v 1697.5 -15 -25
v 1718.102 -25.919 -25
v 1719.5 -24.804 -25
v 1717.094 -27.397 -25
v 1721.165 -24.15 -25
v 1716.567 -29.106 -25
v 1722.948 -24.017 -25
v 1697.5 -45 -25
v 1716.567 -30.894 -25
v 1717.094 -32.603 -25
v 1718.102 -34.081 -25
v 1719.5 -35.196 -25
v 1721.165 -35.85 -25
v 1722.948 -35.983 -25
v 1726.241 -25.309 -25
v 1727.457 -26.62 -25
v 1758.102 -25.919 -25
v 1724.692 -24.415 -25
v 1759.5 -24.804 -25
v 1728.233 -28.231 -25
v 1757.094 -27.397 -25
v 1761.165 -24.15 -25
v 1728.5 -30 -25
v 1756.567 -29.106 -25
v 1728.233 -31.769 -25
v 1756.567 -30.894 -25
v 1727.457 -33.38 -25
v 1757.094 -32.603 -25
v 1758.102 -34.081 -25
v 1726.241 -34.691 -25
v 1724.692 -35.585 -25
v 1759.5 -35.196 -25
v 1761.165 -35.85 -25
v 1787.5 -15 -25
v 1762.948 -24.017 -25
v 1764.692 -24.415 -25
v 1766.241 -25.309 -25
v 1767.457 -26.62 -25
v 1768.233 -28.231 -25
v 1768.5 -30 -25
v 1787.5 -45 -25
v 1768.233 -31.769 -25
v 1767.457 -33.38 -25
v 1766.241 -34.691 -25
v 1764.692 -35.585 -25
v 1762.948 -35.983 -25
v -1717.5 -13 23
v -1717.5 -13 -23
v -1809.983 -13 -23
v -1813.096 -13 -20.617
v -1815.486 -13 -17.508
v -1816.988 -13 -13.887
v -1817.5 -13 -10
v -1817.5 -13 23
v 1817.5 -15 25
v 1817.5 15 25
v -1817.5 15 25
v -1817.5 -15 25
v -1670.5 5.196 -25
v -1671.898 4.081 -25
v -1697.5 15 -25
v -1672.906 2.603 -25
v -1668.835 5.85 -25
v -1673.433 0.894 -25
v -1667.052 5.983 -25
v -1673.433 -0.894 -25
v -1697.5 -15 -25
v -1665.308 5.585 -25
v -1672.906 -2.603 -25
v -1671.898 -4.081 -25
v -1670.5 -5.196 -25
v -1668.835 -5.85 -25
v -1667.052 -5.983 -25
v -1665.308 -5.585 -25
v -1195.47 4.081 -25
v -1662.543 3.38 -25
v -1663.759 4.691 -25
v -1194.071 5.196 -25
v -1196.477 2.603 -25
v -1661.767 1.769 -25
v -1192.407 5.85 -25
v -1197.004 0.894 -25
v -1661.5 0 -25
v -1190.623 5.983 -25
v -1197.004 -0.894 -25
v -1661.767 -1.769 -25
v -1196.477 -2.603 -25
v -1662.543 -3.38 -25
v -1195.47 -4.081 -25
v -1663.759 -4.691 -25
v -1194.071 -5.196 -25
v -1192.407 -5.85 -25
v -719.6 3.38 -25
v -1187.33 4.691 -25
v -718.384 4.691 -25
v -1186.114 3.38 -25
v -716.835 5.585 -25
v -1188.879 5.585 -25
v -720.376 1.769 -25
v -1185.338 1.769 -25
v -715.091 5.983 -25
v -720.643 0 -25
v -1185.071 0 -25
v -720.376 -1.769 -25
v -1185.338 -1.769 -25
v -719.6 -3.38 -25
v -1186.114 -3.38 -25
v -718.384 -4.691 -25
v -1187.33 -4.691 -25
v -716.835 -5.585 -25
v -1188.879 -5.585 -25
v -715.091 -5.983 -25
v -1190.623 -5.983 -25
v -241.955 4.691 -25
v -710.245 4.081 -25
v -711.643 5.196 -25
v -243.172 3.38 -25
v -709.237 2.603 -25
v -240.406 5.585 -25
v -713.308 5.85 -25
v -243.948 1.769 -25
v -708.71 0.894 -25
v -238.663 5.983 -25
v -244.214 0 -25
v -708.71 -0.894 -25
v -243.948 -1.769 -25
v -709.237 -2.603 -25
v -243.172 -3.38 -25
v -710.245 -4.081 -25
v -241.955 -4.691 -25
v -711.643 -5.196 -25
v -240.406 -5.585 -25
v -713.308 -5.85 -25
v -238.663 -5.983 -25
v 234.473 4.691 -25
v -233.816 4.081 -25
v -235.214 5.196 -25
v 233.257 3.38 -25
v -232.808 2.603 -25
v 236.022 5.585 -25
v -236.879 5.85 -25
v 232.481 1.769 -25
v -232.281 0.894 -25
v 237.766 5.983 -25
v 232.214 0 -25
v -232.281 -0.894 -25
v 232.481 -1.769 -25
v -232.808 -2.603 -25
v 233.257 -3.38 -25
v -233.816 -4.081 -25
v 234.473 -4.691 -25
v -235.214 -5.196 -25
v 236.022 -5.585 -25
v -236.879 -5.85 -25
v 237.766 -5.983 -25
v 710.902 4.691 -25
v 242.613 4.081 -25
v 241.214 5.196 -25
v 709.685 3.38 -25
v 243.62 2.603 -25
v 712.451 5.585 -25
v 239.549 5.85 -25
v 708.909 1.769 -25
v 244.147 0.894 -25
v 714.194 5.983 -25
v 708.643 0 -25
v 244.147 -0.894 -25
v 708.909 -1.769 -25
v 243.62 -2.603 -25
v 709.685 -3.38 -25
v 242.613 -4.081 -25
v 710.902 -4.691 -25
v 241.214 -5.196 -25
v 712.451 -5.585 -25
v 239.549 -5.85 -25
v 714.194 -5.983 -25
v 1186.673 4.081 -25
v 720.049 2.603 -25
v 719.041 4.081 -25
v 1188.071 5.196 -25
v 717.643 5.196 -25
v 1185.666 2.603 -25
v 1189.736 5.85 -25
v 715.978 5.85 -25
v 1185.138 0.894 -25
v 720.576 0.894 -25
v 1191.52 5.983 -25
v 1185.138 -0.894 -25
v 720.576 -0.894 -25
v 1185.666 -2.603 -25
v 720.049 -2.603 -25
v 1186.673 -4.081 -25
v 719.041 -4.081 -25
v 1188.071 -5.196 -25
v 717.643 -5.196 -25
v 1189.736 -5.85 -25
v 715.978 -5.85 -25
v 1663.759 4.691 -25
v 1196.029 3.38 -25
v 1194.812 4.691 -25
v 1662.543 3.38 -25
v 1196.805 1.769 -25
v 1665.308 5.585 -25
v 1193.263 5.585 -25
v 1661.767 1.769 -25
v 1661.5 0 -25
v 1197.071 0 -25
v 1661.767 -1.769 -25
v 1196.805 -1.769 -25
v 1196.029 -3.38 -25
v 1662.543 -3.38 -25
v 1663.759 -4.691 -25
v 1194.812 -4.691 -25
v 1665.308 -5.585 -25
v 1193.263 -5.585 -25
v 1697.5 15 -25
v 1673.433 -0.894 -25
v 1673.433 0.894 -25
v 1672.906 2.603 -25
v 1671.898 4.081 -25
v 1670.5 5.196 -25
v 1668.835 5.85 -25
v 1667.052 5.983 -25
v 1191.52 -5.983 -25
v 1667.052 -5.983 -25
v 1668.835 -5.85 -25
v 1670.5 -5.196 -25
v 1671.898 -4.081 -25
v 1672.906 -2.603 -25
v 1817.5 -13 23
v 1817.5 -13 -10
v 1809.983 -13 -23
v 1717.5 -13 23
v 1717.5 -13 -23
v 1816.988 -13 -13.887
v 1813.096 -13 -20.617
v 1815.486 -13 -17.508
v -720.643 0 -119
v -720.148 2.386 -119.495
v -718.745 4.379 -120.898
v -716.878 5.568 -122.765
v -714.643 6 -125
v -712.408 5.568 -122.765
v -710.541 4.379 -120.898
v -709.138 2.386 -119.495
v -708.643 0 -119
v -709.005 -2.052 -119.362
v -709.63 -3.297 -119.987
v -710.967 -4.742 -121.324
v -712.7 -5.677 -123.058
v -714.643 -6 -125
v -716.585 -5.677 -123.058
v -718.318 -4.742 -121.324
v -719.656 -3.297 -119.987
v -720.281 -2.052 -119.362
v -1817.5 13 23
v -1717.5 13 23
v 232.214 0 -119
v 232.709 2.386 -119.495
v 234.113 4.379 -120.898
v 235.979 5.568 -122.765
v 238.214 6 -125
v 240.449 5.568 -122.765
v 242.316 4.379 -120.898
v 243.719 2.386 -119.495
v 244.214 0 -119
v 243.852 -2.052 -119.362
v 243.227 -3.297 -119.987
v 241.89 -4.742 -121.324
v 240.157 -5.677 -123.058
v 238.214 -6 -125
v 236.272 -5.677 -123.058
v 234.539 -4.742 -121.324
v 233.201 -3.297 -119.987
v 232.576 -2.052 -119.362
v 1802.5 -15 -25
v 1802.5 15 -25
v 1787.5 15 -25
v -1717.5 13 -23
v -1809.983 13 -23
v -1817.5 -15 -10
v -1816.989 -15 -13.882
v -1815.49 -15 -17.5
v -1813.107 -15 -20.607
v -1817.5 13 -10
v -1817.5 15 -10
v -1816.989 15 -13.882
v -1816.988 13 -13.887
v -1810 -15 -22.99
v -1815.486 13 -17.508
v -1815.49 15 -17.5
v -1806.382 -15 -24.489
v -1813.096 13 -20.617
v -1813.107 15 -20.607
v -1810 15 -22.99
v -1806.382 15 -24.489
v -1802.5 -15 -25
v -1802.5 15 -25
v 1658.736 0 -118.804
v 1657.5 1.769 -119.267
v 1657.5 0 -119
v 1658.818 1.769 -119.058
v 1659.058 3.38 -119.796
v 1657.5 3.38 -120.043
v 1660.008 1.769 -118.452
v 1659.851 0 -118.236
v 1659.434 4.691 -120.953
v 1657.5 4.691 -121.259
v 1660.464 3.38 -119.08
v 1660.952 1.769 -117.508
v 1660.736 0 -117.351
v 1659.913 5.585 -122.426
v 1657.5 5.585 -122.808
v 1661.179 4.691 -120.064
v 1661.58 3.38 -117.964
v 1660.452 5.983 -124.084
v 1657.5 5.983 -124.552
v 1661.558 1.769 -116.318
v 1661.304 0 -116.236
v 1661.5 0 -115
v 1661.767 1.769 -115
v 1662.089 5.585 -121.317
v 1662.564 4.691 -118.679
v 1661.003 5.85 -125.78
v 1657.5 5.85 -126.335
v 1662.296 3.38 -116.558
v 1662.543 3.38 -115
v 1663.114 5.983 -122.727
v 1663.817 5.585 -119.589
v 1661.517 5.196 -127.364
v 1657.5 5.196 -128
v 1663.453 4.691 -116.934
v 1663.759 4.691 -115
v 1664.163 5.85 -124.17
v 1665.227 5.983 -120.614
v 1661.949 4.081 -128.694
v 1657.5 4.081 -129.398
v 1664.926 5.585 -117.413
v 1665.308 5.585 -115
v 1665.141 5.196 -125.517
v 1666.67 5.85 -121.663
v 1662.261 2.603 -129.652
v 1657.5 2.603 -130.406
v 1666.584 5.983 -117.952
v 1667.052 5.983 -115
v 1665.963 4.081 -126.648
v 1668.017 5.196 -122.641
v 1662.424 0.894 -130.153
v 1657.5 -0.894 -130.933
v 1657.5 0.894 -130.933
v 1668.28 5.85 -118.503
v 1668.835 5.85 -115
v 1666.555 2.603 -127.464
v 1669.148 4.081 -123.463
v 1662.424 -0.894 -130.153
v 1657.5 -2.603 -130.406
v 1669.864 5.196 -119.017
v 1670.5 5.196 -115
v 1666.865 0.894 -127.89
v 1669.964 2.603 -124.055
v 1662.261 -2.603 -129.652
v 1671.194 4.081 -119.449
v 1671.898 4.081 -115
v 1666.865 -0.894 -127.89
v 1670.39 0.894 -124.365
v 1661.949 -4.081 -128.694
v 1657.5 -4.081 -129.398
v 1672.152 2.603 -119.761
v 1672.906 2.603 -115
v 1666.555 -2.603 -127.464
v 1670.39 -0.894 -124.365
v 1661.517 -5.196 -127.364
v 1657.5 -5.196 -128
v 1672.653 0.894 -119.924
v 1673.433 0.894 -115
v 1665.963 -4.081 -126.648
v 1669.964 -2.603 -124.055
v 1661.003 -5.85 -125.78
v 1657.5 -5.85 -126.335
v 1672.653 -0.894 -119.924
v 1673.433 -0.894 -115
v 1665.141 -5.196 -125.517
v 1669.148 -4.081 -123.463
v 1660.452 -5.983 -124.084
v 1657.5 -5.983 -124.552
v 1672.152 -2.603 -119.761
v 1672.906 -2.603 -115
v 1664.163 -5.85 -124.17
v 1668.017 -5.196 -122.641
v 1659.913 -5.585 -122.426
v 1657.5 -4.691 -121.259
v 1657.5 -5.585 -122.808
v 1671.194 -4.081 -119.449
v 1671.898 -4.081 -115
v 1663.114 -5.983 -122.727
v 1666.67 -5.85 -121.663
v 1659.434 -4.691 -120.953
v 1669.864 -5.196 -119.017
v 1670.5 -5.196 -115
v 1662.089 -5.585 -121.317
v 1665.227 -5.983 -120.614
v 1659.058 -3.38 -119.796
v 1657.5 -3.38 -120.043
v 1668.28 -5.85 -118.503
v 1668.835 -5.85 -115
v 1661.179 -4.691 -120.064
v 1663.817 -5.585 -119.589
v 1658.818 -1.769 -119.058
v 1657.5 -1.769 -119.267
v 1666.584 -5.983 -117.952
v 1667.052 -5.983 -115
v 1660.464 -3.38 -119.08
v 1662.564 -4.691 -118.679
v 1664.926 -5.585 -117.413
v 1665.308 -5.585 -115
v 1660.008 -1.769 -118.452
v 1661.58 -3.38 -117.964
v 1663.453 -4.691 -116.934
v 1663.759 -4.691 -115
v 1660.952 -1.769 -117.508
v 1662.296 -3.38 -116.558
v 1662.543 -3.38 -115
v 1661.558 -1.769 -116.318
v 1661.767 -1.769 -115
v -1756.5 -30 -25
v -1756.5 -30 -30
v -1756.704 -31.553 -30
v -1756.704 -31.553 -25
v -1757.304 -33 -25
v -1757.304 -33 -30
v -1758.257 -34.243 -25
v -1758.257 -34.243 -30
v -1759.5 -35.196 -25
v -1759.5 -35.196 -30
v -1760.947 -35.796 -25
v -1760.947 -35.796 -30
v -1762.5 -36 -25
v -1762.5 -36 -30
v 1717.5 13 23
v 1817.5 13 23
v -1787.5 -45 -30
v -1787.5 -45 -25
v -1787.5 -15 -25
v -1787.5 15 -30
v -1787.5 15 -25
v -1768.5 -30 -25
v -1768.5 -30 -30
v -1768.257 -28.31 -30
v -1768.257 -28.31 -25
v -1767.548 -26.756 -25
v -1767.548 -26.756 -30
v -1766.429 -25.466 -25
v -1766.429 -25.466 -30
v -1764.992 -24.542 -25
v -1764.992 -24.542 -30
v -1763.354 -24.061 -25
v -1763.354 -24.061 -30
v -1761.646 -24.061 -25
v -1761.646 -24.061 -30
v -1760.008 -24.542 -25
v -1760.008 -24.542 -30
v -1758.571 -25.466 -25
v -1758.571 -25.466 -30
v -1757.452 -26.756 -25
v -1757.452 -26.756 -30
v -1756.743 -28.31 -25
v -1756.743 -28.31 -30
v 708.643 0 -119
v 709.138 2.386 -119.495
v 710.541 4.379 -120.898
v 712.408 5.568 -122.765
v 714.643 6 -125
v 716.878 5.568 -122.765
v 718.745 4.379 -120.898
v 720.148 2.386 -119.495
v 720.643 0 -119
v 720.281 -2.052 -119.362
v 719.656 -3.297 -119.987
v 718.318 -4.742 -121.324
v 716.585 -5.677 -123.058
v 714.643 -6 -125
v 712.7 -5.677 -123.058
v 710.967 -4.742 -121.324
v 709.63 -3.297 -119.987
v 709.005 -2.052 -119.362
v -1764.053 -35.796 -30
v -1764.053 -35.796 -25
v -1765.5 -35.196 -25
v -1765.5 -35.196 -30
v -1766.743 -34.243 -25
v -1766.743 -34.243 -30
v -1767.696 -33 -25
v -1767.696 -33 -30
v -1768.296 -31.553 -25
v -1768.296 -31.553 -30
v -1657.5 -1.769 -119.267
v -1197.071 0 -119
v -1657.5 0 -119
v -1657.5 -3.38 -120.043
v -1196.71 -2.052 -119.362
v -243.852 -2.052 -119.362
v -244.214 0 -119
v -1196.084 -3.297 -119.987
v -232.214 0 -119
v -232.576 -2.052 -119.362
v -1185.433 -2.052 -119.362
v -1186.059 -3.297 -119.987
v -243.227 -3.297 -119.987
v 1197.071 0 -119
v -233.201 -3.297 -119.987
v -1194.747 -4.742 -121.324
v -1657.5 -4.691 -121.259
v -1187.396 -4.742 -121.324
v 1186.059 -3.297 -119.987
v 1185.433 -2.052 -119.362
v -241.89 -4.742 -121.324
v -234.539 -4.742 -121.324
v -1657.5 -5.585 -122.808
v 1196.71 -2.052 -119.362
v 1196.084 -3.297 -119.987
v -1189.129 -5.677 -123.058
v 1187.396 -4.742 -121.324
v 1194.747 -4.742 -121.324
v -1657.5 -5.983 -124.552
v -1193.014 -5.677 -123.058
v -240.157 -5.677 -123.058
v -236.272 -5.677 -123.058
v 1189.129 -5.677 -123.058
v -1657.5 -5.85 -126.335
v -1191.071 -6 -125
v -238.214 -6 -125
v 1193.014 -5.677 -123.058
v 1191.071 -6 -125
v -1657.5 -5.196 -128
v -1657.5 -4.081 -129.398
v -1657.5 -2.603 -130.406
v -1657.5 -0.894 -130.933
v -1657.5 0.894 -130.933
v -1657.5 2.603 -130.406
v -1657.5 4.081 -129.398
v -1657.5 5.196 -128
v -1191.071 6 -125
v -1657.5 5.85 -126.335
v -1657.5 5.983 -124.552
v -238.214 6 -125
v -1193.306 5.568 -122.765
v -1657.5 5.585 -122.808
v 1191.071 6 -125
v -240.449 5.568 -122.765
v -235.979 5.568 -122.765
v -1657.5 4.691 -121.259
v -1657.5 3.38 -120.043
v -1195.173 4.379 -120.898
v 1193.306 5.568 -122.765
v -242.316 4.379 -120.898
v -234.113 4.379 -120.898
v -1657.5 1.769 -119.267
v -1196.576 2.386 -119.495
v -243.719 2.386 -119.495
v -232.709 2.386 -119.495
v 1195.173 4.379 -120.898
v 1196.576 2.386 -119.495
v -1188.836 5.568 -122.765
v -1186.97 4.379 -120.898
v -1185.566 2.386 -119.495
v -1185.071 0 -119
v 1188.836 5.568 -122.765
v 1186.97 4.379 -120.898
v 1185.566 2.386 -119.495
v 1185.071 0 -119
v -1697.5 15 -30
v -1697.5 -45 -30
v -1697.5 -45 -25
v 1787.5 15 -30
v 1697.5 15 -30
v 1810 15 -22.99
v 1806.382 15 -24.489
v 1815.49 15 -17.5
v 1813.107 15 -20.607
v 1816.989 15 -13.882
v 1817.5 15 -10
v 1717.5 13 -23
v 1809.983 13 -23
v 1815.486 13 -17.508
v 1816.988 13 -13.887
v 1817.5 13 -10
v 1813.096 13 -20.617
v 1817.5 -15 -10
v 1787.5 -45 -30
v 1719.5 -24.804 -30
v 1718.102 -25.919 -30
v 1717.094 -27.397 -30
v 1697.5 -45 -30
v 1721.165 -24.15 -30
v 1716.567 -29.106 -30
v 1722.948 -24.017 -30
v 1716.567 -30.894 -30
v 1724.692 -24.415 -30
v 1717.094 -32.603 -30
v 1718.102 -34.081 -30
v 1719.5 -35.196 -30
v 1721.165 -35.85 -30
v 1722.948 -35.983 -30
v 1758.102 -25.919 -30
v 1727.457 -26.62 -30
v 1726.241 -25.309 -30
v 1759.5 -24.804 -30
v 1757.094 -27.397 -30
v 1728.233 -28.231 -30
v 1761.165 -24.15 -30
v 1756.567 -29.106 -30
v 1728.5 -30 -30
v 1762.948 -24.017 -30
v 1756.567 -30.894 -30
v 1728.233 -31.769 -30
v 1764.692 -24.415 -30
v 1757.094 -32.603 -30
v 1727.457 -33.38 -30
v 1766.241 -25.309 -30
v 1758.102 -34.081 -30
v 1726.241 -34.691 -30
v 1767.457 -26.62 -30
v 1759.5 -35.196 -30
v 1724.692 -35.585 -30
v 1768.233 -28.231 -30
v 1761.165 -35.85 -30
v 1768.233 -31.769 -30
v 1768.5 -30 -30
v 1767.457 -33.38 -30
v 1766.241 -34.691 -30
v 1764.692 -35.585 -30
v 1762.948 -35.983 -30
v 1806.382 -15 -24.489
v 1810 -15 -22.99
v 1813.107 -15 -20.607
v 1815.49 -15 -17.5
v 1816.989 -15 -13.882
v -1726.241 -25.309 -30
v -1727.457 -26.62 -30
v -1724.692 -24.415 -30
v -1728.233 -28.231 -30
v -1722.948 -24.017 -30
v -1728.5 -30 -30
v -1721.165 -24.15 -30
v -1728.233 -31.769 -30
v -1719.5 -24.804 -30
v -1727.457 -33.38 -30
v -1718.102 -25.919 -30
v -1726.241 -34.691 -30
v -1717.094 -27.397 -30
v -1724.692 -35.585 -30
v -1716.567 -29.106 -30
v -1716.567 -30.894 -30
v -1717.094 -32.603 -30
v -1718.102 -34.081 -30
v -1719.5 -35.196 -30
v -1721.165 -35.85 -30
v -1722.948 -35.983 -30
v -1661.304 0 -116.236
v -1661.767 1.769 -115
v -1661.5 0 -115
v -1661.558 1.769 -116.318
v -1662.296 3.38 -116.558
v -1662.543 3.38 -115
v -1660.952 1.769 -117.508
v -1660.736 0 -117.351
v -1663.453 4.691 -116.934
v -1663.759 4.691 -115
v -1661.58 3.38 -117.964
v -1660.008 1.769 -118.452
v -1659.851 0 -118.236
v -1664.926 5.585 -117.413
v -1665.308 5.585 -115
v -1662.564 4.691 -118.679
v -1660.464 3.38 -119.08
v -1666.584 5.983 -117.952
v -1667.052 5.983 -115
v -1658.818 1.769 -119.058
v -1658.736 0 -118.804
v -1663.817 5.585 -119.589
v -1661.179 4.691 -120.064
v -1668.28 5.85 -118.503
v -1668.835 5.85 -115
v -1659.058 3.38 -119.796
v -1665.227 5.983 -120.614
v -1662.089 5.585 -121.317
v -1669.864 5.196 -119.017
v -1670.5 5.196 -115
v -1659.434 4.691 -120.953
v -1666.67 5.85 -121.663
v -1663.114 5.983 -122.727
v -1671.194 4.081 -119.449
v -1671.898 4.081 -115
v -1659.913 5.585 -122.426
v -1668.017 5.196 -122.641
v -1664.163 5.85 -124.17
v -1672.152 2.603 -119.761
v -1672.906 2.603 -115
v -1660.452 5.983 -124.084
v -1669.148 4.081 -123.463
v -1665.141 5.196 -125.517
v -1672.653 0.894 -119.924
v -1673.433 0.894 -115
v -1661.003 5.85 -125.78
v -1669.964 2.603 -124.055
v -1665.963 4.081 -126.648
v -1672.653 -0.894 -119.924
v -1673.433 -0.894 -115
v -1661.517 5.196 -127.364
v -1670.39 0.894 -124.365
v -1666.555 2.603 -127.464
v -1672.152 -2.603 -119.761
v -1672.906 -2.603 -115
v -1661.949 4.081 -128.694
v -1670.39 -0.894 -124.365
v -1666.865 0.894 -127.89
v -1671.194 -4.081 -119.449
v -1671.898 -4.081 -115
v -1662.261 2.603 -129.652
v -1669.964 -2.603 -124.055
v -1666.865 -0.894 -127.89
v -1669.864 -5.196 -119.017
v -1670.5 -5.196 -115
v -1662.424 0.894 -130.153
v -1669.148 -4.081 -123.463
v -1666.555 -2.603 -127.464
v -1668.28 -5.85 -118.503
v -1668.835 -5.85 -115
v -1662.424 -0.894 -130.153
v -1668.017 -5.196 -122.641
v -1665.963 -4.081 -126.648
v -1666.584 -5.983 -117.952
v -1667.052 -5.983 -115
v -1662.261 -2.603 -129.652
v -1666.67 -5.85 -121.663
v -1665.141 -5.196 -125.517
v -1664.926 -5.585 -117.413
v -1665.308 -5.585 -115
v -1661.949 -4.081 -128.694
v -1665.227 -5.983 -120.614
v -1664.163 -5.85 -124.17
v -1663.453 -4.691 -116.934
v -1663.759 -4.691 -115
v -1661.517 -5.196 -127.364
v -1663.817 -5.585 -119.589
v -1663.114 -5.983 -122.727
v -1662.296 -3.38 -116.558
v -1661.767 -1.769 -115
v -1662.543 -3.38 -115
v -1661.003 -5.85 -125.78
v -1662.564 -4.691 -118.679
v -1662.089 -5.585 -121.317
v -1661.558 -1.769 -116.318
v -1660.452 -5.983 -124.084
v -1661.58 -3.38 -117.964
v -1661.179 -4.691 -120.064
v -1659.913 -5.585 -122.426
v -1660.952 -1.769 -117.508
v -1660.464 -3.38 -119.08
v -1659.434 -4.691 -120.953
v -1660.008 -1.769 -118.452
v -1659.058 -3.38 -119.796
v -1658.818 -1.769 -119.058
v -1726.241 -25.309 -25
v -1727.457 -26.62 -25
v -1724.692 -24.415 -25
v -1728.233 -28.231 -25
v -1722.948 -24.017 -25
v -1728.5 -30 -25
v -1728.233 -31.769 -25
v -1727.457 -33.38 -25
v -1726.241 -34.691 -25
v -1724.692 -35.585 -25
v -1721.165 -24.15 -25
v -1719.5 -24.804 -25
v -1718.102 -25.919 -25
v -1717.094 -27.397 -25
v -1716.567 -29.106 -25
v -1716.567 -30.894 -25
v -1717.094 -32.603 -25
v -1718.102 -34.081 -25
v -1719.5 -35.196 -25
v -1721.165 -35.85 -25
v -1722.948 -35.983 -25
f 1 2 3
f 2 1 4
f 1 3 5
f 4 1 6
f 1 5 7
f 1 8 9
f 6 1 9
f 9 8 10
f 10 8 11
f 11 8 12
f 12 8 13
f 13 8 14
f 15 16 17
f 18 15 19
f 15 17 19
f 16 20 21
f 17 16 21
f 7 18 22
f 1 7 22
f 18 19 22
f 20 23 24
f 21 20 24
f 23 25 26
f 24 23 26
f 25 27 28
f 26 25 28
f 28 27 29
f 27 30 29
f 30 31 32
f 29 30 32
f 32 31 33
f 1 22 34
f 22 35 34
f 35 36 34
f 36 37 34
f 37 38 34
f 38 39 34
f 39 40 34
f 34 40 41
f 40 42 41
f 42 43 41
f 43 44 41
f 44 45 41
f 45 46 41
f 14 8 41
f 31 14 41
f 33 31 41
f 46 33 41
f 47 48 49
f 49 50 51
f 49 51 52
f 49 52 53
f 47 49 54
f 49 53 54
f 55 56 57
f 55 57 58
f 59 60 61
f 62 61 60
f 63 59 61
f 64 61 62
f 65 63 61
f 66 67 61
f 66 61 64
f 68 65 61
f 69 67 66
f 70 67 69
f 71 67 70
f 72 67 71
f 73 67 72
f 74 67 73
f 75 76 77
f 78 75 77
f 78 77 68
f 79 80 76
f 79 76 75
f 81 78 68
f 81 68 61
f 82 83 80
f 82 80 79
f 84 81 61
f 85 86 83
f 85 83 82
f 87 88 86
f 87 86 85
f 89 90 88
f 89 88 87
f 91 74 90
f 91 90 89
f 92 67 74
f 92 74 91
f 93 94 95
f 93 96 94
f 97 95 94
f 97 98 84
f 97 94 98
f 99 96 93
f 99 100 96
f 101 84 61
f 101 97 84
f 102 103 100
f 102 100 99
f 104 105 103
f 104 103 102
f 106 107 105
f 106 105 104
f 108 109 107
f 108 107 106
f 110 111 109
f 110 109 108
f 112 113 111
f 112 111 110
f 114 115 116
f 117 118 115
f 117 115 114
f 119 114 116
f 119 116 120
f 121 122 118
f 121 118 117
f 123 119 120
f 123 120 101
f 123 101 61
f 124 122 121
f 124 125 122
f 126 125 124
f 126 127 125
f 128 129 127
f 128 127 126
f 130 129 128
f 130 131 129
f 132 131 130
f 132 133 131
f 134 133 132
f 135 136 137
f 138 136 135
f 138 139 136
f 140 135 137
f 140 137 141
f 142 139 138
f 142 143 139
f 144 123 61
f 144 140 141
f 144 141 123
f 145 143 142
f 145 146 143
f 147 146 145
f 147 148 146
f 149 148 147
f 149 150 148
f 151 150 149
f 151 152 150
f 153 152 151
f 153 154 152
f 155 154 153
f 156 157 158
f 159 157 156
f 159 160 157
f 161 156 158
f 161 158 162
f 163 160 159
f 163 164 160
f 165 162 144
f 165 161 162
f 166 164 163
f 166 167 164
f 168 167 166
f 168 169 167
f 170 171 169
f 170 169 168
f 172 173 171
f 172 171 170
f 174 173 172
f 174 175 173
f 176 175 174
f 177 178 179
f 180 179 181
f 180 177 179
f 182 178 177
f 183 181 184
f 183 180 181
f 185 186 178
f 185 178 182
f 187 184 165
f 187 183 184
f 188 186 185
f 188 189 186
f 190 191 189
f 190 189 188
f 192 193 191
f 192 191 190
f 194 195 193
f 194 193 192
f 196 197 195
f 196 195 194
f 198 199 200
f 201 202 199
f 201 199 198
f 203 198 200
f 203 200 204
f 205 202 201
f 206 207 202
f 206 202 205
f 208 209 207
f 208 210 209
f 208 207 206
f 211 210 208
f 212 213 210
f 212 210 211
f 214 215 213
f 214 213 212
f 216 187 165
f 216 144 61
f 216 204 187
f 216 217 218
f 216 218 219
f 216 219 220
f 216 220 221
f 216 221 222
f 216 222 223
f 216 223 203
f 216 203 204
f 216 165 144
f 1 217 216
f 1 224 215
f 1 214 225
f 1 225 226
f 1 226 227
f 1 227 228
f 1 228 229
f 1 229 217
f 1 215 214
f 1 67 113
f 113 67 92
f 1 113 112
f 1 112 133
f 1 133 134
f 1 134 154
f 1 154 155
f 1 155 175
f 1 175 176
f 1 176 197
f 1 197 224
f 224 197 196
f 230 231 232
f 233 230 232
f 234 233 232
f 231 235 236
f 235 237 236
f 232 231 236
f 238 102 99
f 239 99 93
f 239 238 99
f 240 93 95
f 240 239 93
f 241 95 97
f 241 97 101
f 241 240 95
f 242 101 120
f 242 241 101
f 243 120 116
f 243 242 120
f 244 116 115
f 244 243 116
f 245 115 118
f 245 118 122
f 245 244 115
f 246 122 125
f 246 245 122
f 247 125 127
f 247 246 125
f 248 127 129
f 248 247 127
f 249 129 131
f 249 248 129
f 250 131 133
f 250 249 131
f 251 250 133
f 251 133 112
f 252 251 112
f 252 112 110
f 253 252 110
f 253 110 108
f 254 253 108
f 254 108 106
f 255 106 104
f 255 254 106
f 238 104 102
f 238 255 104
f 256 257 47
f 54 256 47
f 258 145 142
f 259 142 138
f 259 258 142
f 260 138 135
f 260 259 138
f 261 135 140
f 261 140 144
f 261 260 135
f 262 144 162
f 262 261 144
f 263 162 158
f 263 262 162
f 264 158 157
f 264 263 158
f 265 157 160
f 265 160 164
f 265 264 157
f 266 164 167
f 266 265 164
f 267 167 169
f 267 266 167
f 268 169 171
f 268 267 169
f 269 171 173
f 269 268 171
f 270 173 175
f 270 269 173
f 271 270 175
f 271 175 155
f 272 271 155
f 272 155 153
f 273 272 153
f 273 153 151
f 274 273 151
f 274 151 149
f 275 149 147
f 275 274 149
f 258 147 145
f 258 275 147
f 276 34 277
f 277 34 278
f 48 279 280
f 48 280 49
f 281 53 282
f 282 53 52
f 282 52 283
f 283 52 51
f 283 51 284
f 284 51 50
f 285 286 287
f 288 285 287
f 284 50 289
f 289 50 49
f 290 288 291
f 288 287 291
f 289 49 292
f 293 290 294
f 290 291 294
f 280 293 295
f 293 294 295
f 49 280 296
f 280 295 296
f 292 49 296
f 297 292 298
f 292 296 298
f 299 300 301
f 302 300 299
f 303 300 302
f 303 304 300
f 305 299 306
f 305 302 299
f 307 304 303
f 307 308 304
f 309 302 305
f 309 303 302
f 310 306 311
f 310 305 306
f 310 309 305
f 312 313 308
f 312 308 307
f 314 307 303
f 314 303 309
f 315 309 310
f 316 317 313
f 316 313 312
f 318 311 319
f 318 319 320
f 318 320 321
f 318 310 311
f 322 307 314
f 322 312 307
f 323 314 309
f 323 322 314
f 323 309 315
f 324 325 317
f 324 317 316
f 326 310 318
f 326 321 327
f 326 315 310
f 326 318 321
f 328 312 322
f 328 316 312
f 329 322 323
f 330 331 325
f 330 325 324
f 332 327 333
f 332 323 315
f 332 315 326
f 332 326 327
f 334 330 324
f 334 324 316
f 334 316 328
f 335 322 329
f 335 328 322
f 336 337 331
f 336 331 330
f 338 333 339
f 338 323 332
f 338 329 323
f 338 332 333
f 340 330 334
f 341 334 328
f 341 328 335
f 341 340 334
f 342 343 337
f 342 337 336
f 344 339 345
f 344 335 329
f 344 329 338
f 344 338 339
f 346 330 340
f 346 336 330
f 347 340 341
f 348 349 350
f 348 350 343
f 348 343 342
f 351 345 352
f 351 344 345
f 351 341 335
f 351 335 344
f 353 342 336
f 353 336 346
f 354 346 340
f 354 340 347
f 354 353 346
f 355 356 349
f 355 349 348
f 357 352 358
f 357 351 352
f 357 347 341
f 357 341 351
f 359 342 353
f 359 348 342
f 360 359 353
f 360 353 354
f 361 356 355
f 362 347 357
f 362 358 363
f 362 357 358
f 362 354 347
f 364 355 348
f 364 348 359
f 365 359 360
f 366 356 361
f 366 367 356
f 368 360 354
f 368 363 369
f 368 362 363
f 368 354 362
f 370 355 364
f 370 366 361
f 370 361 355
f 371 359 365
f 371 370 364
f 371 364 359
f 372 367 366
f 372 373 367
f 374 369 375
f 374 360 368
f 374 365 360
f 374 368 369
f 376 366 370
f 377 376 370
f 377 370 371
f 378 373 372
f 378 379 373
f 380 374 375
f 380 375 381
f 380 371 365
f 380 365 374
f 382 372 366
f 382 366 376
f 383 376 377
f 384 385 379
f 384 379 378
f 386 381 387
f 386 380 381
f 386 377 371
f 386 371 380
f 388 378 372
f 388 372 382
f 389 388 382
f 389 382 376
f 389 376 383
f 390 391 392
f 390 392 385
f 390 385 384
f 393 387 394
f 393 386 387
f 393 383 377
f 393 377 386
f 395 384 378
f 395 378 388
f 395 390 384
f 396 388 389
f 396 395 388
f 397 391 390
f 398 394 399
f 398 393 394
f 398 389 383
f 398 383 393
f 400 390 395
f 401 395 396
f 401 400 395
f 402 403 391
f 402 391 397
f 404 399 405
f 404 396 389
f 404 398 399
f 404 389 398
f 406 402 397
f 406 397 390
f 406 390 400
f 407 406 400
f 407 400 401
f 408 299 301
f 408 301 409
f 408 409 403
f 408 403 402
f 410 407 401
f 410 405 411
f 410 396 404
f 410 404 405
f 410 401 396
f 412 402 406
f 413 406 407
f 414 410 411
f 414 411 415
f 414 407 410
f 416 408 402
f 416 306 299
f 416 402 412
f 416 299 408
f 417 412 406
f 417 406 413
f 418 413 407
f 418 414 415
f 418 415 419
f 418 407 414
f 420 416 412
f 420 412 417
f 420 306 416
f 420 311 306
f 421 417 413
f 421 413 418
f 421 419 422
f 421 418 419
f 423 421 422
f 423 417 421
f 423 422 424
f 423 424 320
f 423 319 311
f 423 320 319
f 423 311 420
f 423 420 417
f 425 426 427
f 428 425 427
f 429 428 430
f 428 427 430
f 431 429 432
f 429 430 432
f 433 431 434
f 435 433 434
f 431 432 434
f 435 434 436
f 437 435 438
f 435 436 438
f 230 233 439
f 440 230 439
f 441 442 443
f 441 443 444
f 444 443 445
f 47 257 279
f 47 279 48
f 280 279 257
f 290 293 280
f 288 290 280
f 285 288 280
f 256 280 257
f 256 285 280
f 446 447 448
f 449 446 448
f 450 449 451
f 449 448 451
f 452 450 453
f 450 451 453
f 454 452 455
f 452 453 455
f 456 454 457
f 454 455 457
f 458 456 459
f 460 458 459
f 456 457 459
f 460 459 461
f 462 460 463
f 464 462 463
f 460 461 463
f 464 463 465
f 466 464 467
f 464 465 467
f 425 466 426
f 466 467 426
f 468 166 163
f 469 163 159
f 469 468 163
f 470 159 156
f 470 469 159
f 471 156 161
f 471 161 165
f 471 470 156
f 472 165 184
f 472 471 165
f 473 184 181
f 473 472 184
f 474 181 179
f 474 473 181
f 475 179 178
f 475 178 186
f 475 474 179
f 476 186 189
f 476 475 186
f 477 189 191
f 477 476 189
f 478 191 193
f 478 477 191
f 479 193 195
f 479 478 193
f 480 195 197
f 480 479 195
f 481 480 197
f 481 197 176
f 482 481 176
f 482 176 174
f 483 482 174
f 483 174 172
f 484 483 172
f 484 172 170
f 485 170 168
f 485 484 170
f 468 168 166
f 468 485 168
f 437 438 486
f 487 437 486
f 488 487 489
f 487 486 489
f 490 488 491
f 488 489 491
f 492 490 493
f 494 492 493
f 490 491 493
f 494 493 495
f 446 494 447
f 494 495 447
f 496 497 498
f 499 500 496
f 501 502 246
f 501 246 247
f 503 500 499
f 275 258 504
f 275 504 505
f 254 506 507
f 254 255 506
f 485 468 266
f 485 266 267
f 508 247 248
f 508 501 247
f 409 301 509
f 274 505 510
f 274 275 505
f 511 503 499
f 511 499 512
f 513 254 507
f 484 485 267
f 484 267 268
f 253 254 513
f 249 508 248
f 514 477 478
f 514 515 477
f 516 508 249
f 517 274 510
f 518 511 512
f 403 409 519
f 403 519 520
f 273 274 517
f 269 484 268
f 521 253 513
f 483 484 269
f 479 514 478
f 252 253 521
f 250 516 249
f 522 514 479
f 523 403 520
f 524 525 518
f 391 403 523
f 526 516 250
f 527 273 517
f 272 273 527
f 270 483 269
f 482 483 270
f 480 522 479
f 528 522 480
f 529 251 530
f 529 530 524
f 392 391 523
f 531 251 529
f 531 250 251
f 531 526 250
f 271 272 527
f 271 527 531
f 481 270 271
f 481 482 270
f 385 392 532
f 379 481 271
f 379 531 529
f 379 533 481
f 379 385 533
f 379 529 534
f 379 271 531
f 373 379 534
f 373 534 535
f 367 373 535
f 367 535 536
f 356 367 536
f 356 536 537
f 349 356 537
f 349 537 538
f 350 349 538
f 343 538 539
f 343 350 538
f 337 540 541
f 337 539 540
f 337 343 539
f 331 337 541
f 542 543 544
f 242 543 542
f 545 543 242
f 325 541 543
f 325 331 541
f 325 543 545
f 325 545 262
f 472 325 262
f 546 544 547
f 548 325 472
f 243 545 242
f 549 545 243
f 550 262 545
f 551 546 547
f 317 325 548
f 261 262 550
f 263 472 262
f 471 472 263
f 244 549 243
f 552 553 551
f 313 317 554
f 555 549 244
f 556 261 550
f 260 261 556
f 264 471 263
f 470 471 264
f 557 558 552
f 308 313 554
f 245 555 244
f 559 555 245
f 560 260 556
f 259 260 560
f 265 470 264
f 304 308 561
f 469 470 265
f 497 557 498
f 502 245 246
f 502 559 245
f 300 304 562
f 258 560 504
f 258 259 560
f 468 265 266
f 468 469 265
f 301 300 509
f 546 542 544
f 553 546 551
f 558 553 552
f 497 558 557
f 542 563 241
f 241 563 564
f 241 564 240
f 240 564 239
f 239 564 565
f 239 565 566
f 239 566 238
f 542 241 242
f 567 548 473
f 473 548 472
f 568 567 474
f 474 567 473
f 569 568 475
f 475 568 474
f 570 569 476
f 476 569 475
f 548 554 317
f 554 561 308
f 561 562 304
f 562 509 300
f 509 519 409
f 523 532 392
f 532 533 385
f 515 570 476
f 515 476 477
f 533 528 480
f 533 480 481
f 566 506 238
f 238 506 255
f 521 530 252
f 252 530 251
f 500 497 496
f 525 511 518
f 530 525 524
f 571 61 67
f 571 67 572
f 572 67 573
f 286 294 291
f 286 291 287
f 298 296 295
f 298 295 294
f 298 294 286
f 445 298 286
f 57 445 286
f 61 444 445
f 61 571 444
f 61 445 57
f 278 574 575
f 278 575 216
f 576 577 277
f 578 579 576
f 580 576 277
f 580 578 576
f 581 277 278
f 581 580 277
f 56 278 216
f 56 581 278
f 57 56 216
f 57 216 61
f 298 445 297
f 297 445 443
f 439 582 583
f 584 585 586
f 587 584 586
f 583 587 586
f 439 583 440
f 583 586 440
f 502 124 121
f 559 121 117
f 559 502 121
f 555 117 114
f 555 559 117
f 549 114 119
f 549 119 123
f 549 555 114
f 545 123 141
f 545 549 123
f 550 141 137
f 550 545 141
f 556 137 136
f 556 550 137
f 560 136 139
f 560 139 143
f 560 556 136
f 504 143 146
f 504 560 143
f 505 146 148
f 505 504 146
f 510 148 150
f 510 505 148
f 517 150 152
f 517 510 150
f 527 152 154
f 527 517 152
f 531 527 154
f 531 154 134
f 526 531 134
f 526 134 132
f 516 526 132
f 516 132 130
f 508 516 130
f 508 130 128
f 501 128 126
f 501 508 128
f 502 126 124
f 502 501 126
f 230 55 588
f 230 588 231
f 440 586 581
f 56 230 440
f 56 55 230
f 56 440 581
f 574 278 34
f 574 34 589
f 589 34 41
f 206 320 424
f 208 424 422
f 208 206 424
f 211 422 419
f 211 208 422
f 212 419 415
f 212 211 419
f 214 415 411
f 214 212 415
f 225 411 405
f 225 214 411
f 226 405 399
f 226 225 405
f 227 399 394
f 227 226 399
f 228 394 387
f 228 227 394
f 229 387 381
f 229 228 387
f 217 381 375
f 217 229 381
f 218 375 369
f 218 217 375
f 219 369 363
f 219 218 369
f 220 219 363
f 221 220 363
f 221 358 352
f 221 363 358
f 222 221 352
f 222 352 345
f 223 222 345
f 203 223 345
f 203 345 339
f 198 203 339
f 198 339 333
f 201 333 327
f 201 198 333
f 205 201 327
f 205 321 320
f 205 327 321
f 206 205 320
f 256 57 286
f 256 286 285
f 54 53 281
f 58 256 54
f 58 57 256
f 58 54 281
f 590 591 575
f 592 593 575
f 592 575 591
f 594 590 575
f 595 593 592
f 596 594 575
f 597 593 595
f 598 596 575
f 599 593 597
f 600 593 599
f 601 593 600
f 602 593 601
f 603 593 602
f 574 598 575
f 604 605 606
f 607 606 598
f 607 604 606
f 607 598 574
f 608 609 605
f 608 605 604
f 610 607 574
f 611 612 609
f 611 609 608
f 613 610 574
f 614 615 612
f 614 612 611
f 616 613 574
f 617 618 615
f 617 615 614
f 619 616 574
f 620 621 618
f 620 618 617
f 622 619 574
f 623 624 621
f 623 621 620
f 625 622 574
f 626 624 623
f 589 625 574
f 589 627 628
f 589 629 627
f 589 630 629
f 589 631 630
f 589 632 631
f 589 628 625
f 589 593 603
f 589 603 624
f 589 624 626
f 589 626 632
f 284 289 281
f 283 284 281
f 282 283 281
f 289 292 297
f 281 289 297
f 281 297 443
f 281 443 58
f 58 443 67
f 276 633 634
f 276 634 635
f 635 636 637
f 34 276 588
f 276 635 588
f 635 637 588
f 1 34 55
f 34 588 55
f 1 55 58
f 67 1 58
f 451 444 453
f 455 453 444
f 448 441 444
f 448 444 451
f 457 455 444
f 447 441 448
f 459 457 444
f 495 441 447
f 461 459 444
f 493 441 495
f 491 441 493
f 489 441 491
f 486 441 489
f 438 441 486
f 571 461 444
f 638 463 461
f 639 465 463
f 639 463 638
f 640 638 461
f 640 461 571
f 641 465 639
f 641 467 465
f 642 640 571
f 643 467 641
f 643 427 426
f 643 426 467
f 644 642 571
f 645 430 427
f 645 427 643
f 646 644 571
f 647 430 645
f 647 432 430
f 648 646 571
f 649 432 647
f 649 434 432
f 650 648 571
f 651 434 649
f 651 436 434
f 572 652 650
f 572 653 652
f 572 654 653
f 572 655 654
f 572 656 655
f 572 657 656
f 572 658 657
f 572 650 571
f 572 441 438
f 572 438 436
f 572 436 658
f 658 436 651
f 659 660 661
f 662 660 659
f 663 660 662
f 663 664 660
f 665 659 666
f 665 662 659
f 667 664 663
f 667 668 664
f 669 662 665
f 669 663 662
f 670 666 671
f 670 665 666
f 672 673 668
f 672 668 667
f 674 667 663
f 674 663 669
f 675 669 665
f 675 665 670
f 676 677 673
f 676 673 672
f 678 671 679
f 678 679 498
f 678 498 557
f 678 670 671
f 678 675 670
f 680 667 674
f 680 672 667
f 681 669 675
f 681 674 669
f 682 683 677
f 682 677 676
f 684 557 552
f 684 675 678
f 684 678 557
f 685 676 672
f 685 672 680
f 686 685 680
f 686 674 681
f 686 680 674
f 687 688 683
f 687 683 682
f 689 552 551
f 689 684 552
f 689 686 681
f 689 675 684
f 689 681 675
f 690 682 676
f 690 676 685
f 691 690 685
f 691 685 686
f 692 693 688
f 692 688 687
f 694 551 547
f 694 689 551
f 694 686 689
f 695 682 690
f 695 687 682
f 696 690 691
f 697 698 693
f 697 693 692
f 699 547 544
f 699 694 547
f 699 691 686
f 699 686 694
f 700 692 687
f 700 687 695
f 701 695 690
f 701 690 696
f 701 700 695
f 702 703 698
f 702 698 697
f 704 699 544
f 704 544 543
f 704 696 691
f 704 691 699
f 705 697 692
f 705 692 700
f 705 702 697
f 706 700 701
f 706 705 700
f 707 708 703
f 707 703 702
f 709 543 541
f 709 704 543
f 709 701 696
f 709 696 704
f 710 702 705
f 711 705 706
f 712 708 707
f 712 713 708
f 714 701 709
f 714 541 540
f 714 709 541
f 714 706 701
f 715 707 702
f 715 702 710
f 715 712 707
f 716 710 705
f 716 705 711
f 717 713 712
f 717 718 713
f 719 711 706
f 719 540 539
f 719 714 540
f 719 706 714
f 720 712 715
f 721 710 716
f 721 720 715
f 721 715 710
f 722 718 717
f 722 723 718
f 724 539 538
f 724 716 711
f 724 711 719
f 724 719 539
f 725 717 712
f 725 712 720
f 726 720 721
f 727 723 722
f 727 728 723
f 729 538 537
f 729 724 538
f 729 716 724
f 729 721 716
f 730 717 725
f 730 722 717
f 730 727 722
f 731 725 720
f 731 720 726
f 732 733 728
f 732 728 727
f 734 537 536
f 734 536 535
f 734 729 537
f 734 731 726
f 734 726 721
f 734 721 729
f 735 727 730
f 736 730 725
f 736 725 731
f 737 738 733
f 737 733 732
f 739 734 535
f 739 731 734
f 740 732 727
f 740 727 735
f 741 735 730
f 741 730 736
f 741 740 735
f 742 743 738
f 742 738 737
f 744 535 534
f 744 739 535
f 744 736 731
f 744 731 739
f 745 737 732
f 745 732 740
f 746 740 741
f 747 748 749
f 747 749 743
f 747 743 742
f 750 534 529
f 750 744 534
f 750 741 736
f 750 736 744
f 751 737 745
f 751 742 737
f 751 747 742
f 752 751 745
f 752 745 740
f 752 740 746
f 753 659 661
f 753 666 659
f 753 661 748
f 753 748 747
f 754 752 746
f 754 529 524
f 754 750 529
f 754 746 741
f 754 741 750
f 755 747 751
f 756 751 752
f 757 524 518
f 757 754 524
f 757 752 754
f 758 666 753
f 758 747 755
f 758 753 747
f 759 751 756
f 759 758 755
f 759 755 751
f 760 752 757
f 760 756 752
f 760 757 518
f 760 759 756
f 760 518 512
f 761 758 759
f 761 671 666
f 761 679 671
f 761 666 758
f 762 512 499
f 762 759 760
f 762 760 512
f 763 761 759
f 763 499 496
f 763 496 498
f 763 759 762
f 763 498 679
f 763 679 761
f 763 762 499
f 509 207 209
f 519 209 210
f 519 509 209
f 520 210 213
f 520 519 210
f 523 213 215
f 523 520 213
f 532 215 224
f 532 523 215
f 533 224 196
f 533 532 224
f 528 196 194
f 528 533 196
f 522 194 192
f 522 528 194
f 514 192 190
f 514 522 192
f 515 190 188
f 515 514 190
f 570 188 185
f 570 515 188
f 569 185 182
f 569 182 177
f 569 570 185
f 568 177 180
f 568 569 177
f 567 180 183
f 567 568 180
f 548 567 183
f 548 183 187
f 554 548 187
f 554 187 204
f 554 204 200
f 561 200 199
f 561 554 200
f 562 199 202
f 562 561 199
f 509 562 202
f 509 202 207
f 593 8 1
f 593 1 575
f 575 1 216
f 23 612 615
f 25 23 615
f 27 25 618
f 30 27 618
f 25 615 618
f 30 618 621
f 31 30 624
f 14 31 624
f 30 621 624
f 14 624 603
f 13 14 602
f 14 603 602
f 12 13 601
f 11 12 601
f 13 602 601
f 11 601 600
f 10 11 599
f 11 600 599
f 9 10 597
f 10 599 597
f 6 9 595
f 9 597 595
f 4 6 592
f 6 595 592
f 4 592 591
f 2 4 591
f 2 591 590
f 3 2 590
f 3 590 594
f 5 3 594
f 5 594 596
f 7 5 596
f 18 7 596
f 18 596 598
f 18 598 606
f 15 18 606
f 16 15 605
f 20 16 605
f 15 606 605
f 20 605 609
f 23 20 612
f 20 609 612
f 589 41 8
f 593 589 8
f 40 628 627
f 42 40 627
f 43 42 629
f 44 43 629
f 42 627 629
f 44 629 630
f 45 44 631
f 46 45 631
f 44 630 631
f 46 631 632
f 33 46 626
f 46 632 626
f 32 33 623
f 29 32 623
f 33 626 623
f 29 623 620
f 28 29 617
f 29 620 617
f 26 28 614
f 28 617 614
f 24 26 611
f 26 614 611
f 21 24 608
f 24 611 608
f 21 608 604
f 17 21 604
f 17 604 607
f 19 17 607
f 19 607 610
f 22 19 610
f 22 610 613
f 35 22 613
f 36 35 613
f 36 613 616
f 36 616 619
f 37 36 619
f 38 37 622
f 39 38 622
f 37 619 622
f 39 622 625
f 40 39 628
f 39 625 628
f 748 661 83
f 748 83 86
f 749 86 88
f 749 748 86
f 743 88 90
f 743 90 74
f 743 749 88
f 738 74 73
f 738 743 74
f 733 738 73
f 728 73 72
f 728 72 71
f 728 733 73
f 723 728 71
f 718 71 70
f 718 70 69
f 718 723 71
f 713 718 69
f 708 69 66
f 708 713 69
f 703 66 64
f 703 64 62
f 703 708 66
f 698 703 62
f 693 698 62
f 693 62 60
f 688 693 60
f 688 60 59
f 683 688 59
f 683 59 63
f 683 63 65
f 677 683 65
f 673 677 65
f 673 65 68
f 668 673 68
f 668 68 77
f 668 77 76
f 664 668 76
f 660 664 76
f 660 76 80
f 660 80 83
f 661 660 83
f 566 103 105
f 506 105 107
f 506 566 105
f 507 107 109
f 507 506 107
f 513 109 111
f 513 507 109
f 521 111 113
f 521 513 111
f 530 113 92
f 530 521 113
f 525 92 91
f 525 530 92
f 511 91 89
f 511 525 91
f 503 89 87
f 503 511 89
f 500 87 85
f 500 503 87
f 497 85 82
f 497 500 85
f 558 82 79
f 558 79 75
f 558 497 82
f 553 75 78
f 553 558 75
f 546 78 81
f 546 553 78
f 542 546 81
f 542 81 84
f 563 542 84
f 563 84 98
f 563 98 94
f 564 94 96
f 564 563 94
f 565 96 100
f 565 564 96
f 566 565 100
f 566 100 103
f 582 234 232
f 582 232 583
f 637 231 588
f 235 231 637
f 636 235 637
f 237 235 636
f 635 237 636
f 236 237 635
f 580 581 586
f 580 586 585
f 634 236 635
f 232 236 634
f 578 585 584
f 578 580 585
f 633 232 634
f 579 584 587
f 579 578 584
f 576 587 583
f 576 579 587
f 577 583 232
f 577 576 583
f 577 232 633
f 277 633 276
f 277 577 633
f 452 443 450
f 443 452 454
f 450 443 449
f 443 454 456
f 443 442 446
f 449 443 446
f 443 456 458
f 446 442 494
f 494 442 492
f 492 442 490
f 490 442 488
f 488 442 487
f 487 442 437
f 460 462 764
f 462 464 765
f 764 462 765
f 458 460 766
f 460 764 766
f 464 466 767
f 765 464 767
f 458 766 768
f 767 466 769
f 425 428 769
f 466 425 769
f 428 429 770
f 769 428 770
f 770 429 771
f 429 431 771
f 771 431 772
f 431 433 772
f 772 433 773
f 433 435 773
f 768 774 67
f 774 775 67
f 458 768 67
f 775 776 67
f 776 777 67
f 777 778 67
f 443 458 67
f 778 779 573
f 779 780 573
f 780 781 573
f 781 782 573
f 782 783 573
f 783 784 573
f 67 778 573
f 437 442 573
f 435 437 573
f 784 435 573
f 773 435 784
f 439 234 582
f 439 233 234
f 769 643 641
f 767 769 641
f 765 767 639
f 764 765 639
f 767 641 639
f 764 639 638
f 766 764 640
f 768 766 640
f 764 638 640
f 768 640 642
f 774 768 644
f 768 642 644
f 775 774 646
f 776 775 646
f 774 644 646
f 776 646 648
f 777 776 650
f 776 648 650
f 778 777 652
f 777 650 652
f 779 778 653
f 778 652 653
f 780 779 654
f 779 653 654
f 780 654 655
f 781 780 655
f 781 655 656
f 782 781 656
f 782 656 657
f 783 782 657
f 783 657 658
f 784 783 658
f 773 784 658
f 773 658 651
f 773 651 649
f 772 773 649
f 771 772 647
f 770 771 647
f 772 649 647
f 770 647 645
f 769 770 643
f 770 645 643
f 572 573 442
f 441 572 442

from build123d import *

# Parameters (mm, degrees)
F0_W          = 3575
F0_H          = 50
F1_DEPTH      = 15
F1_DEPTH_BACK = 15
F3_DEPTH      = 5
F5_DEPTH      = 5
F6_R          = 6
F7_DEPTH      = 5
F8_R          = 6
F9_DEPTH      = 5
F10_R         = 6
F21_DEPTH     = 5
F22_W         = 30
F22_H         = 50
F23_DEPTH     = 30
F24_R         = 15
F25_W         = 26
F25_H         = 13
F25_H_2       = 33
F26_DEPTH     = 100
F27_W         = 30
F27_H         = 50
F28_DEPTH     = 30
F29_W         = 26
F29_H         = 46
F30_DEPTH     = 100
F31_T1_DEPTH  = 105


# Not quite as in the source:
# - a fillet or chamfer that OpenCascade refuses, or shapes differently, is made with other operations: its cross-section is extruded or revolved along the edge and cut away or added


with BuildPart() as f1:
    # F0 (on Front) → F1 (new body, two sides)
    with BuildSketch(Plane.XZ) as f1_sk:
        Rectangle(F0_W, F0_H)
    extrude(amount=F1_DEPTH)
    extrude(f1_sk.sketch, amount=-F1_DEPTH_BACK)

    # F2 (on face) → F3 (join)
    with BuildSketch(Plane(origin=(0, 0, -25), x_dir=(1, 0, 0), z_dir=(0, 0, -1))):
        Polygon((-1787.5, 45), (-1787.5, 15), (-1787.5, -15), (-1697.5, -15), (-1697.5, 45), align=None)
    extrude(amount=F3_DEPTH)

    # F4 (on face) → F5 (join)
    with BuildSketch(Plane(origin=(0, 0, -25), x_dir=(1, 0, 0), z_dir=(0, 0, -1))):
        Polygon((1787.5, -15), (1787.5, 15), (1787.5, 45), (1697.5, 45), (1697.5, -15), align=None)
    extrude(amount=F5_DEPTH)

    # F6 (on face) → F7 (cut, through all)
    with BuildSketch(Plane(origin=(0, 0, -30), x_dir=(1, 0, 0), z_dir=(0, 0, -1))):
        with Locations((-935, 30)):
            Circle(F6_R)
        with Locations((-975, 30)):
            Circle(F6_R)
    extrude(amount=-F7_DEPTH, mode=Mode.SUBTRACT)

    # F8 (on face) → F9 (cut, through all)
    with BuildSketch(Plane(origin=(0, 0, -30), x_dir=(1, 0, 0), z_dir=(0, 0, -1))):
        with Locations((1762.5, 30)):
            Circle(F8_R)
        with Locations((1722.5, 30)):
            Circle(F8_R)
    extrude(amount=-F9_DEPTH, mode=Mode.SUBTRACT)

    # F12: sweep along a path in F11
    with BuildLine(Plane.XZ) as f12_path:
        Line((-1667.5, -25), (-1667.5, -115))
        ThreePointArc((-1667.5, -115), (-1664.5710678119, -122.0710678119), (-1657.5, -125))
        Line((-1657.5, -125), (1657.5, -125))
        ThreePointArc((1657.5, -125), (1664.5710678119, -122.0710678119), (1667.5, -115))
        Line((1667.5, -115), (1667.5, -25))
    # F10 (on face) → F12 (sweep)
    with BuildSketch(Plane(origin=(0, 0, -25), x_dir=(1, 0, 0), z_dir=(0, 0, -1))):
        with Locations((-1667.5, 0)):
            Circle(F10_R)
    sweep(path=f12_path.line)

    # F13: sweep along a path in F11
    with BuildLine(Plane.XZ) as f13_path:
        Line((-1191.0714285714, -25), (-1191.0714285714, -125))
    # F10 (on face) → F13 (sweep)
    with BuildSketch(Plane(origin=(0, 0, -25), x_dir=(1, 0, 0), z_dir=(0, 0, -1))):
        with BuildLine():
            Line((-1191.0714285714, 0), (-1197.0714285714, 0))
            ThreePointArc((-1197.0714285714, 0), (-1191.0714285714, -6), (-1185.0714285714, 0))
            Line((-1185.0714285714, 0), (-1191.0714285714, 0))
        make_face()
        with BuildLine():
            ThreePointArc((-1185.0714285714, 0), (-1191.0714285714, 6), (-1197.0714285714, 0))
            Line((-1197.0714285714, 0), (-1191.0714285714, 0))
            Line((-1191.0714285714, 0), (-1185.0714285714, 0))
        make_face()
    sweep(path=f13_path.line)

    # F14: sweep along a path in F11
    with BuildLine(Plane.XZ) as f14_path:
        Line((-714.6428571429, -25), (-714.6428571429, -125))
    # F10 (on face) → F14 (sweep)
    with BuildSketch(Plane(origin=(0, 0, -25), x_dir=(1, 0, 0), z_dir=(0, 0, -1))):
        with BuildLine():
            ThreePointArc((-708.6428571429, 0), (-714.6428571429, 6), (-720.6428571429, 0))
            Line((-720.6428571429, 0), (-714.6428571429, 0))
            Line((-714.6428571429, 0), (-708.6428571429, 0))
        make_face()
        with BuildLine():
            Line((-714.6428571429, 0), (-720.6428571429, 0))
            ThreePointArc((-720.6428571429, 0), (-714.6428571429, -6), (-708.6428571429, 0))
            Line((-708.6428571429, 0), (-714.6428571429, 0))
        make_face()
    sweep(path=f14_path.line)

    # F15: sweep along a path in F11
    with BuildLine(Plane.XZ) as f15_path:
        Line((-238.2142857143, -25), (-238.2142857143, -125))
    # F10 (on face) → F15 (sweep)
    with BuildSketch(Plane(origin=(0, 0, -25), x_dir=(1, 0, 0), z_dir=(0, 0, -1))):
        with BuildLine():
            ThreePointArc((-232.2142857143, 0), (-238.2142857143, 6), (-244.2142857143, 0))
            Line((-244.2142857143, 0), (-238.2142857143, 0))
            Line((-238.2142857143, 0), (-232.2142857143, 0))
        make_face()
        with BuildLine():
            Line((-238.2142857143, 0), (-244.2142857143, 0))
            ThreePointArc((-244.2142857143, 0), (-238.2142857143, -6), (-232.2142857143, 0))
            Line((-232.2142857143, 0), (-238.2142857143, 0))
        make_face()
    sweep(path=f15_path.line)

    # F16: sweep along a path in F11
    with BuildLine(Plane.XZ) as f16_path:
        Line((-1667.5, -25), (-1667.5, -115))
        ThreePointArc((-1667.5, -115), (-1664.5710678119, -122.0710678119), (-1657.5, -125))
        Line((-1657.5, -125), (1657.5, -125))
        ThreePointArc((1657.5, -125), (1664.5710678119, -122.0710678119), (1667.5, -115))
    # F10 (on face) → F16 (sweep)
    with BuildSketch(Plane(origin=(0, 0, -25), x_dir=(1, 0, 0), z_dir=(0, 0, -1))):
        with Locations((-1667.5, 0)):
            Circle(F10_R)
    sweep(path=f16_path.line)

    # F17: sweep along a path in F11
    with BuildLine(Plane.XZ) as f17_path:
        Line((238.2142857143, -25), (238.2142857143, -125))
    # F10 (on face) → F17 (sweep)
    with BuildSketch(Plane(origin=(0, 0, -25), x_dir=(1, 0, 0), z_dir=(0, 0, -1))):
        with BuildLine():
            ThreePointArc((244.2142857143, 0), (238.2142857143, 6), (232.2142857143, 0))
            Line((232.2142857143, 0), (238.2142857143, 0))
            Line((238.2142857143, 0), (244.2142857143, 0))
        make_face()
        with BuildLine():
            Line((238.2142857143, 0), (232.2142857143, 0))
            ThreePointArc((232.2142857143, 0), (238.2142857143, -6), (244.2142857143, 0))
            Line((244.2142857143, 0), (238.2142857143, 0))
        make_face()
    sweep(path=f17_path.line)

    # F18: sweep along a path in F11
    with BuildLine(Plane.XZ) as f18_path:
        Line((714.6428571429, -25), (714.6428571429, -125))
    # F10 (on face) → F18 (sweep)
    with BuildSketch(Plane(origin=(0, 0, -25), x_dir=(1, 0, 0), z_dir=(0, 0, -1))):
        with BuildLine():
            ThreePointArc((720.6428571429, 0), (714.6428571429, 6), (708.6428571429, 0))
            Line((708.6428571429, 0), (714.6428571429, 0))
            Line((714.6428571429, 0), (720.6428571429, 0))
        make_face()
        with BuildLine():
            Line((714.6428571429, 0), (708.6428571429, 0))
            ThreePointArc((708.6428571429, 0), (714.6428571429, -6), (720.6428571429, 0))
            Line((720.6428571429, 0), (714.6428571429, 0))
        make_face()
    sweep(path=f18_path.line)

    # F19: sweep along a path in F11
    with BuildLine(Plane.XZ) as f19_path:
        Line((1191.0714285714, -25), (1191.0714285714, -125))
    # F10 (on face) → F19 (sweep)
    with BuildSketch(Plane(origin=(0, 0, -25), x_dir=(1, 0, 0), z_dir=(0, 0, -1))):
        with BuildLine():
            Line((1191.0714285714, 0), (1185.0714285714, 0))
            ThreePointArc((1185.0714285714, 0), (1191.0714285714, -6), (1197.0714285714, 0))
            Line((1197.0714285714, 0), (1191.0714285714, 0))
        make_face()
        with BuildLine():
            ThreePointArc((1197.0714285714, 0), (1191.0714285714, 6), (1185.0714285714, 0))
            Line((1185.0714285714, 0), (1191.0714285714, 0))
            Line((1191.0714285714, 0), (1197.0714285714, 0))
        make_face()
    sweep(path=f19_path.line)

    # F20 (on face) → F21 (cut, through all)
    with BuildSketch(Plane(origin=(0, 0, -30), x_dir=(1, 0, 0), z_dir=(0, 0, -1))):
        with BuildLine():
            ThreePointArc((-1762.5, 36), (-1766.7426406871, 34.2426406871), (-1768.5, 30))
            Line((-1768.5, 30), (-1762.5, 30))
            Line((-1762.5, 30), (-1762.5, 36))
        make_face()
        with BuildLine():
            ThreePointArc((-1716.5, 30), (-1722.5, 36), (-1728.5, 30))
            ThreePointArc((-1728.5, 30), (-1722.5, 24), (-1716.5, 30))
        make_face()
        with BuildLine():
            Line((-1762.5, 30), (-1768.5, 30))
            ThreePointArc((-1768.5, 30), (-1762.5, 24), (-1756.5, 30))
            Line((-1756.5, 30), (-1762.5, 30))
        make_face()
        with BuildLine():
            Line((-1762.5, 36), (-1762.5, 30))
            Line((-1762.5, 30), (-1756.5, 30))
            ThreePointArc((-1756.5, 30), (-1758.2573593129, 34.2426406871), (-1762.5, 36))
        make_face()
    extrude(amount=-F21_DEPTH, mode=Mode.SUBTRACT)

    # F22 (on face) → F23 (join)
    with BuildSketch(Plane.YZ.offset(1787.5)):
        Rectangle(F22_W, F22_H)
    extrude(amount=F23_DEPTH)

    # F24
    f24_edges = [f1.edges().sort_by_distance(p)[0] for p in [
        (1817.5, 0, -25),
    ]]
    fillet(f24_edges, radius=F24_R)

    # F25 (on face) → F26 (cut)
    with BuildSketch(Plane.YZ.offset(1817.5)):
        with Locations((0, -16.5)):
            Rectangle(F25_W, F25_H)
        with Locations((0, 6.5)):
            Rectangle(F25_W, F25_H_2)
    extrude(amount=-F26_DEPTH, mode=Mode.SUBTRACT)

    # F27 (on face) → F28 (join)
    with BuildSketch(Plane(origin=(-1787.5, 0, 0), x_dir=(0, -1, 0), z_dir=(-1, 0, 0))):
        Rectangle(F27_W, F27_H)
    extrude(amount=F28_DEPTH)

    # F29 (on face) → F30 (cut)
    with BuildSketch(Plane(origin=(-1817.5, 0, 0), x_dir=(0, -1, 0), z_dir=(-1, 0, 0))):
        Rectangle(F29_W, F29_H)
    extrude(amount=-F30_DEPTH, mode=Mode.SUBTRACT)

    # F31: fillet of radius 15 on 1 edges, made by hand

    # F31_s2 → F31_t1 (cut)
    with BuildSketch(Plane.XZ.offset(-52.5)):
        with BuildLine():
            ThreePointArc((-1817.5, -10), (-1813.1066017178, -20.6066017178), (-1802.5, -25))
            Line((-1802.5, -25), (-1817.5, -25))
            Line((-1817.5, -25), (-1817.5, -10))
        make_face()
    extrude(amount=F31_T1_DEPTH, mode=Mode.SUBTRACT)


solid = f1.part
